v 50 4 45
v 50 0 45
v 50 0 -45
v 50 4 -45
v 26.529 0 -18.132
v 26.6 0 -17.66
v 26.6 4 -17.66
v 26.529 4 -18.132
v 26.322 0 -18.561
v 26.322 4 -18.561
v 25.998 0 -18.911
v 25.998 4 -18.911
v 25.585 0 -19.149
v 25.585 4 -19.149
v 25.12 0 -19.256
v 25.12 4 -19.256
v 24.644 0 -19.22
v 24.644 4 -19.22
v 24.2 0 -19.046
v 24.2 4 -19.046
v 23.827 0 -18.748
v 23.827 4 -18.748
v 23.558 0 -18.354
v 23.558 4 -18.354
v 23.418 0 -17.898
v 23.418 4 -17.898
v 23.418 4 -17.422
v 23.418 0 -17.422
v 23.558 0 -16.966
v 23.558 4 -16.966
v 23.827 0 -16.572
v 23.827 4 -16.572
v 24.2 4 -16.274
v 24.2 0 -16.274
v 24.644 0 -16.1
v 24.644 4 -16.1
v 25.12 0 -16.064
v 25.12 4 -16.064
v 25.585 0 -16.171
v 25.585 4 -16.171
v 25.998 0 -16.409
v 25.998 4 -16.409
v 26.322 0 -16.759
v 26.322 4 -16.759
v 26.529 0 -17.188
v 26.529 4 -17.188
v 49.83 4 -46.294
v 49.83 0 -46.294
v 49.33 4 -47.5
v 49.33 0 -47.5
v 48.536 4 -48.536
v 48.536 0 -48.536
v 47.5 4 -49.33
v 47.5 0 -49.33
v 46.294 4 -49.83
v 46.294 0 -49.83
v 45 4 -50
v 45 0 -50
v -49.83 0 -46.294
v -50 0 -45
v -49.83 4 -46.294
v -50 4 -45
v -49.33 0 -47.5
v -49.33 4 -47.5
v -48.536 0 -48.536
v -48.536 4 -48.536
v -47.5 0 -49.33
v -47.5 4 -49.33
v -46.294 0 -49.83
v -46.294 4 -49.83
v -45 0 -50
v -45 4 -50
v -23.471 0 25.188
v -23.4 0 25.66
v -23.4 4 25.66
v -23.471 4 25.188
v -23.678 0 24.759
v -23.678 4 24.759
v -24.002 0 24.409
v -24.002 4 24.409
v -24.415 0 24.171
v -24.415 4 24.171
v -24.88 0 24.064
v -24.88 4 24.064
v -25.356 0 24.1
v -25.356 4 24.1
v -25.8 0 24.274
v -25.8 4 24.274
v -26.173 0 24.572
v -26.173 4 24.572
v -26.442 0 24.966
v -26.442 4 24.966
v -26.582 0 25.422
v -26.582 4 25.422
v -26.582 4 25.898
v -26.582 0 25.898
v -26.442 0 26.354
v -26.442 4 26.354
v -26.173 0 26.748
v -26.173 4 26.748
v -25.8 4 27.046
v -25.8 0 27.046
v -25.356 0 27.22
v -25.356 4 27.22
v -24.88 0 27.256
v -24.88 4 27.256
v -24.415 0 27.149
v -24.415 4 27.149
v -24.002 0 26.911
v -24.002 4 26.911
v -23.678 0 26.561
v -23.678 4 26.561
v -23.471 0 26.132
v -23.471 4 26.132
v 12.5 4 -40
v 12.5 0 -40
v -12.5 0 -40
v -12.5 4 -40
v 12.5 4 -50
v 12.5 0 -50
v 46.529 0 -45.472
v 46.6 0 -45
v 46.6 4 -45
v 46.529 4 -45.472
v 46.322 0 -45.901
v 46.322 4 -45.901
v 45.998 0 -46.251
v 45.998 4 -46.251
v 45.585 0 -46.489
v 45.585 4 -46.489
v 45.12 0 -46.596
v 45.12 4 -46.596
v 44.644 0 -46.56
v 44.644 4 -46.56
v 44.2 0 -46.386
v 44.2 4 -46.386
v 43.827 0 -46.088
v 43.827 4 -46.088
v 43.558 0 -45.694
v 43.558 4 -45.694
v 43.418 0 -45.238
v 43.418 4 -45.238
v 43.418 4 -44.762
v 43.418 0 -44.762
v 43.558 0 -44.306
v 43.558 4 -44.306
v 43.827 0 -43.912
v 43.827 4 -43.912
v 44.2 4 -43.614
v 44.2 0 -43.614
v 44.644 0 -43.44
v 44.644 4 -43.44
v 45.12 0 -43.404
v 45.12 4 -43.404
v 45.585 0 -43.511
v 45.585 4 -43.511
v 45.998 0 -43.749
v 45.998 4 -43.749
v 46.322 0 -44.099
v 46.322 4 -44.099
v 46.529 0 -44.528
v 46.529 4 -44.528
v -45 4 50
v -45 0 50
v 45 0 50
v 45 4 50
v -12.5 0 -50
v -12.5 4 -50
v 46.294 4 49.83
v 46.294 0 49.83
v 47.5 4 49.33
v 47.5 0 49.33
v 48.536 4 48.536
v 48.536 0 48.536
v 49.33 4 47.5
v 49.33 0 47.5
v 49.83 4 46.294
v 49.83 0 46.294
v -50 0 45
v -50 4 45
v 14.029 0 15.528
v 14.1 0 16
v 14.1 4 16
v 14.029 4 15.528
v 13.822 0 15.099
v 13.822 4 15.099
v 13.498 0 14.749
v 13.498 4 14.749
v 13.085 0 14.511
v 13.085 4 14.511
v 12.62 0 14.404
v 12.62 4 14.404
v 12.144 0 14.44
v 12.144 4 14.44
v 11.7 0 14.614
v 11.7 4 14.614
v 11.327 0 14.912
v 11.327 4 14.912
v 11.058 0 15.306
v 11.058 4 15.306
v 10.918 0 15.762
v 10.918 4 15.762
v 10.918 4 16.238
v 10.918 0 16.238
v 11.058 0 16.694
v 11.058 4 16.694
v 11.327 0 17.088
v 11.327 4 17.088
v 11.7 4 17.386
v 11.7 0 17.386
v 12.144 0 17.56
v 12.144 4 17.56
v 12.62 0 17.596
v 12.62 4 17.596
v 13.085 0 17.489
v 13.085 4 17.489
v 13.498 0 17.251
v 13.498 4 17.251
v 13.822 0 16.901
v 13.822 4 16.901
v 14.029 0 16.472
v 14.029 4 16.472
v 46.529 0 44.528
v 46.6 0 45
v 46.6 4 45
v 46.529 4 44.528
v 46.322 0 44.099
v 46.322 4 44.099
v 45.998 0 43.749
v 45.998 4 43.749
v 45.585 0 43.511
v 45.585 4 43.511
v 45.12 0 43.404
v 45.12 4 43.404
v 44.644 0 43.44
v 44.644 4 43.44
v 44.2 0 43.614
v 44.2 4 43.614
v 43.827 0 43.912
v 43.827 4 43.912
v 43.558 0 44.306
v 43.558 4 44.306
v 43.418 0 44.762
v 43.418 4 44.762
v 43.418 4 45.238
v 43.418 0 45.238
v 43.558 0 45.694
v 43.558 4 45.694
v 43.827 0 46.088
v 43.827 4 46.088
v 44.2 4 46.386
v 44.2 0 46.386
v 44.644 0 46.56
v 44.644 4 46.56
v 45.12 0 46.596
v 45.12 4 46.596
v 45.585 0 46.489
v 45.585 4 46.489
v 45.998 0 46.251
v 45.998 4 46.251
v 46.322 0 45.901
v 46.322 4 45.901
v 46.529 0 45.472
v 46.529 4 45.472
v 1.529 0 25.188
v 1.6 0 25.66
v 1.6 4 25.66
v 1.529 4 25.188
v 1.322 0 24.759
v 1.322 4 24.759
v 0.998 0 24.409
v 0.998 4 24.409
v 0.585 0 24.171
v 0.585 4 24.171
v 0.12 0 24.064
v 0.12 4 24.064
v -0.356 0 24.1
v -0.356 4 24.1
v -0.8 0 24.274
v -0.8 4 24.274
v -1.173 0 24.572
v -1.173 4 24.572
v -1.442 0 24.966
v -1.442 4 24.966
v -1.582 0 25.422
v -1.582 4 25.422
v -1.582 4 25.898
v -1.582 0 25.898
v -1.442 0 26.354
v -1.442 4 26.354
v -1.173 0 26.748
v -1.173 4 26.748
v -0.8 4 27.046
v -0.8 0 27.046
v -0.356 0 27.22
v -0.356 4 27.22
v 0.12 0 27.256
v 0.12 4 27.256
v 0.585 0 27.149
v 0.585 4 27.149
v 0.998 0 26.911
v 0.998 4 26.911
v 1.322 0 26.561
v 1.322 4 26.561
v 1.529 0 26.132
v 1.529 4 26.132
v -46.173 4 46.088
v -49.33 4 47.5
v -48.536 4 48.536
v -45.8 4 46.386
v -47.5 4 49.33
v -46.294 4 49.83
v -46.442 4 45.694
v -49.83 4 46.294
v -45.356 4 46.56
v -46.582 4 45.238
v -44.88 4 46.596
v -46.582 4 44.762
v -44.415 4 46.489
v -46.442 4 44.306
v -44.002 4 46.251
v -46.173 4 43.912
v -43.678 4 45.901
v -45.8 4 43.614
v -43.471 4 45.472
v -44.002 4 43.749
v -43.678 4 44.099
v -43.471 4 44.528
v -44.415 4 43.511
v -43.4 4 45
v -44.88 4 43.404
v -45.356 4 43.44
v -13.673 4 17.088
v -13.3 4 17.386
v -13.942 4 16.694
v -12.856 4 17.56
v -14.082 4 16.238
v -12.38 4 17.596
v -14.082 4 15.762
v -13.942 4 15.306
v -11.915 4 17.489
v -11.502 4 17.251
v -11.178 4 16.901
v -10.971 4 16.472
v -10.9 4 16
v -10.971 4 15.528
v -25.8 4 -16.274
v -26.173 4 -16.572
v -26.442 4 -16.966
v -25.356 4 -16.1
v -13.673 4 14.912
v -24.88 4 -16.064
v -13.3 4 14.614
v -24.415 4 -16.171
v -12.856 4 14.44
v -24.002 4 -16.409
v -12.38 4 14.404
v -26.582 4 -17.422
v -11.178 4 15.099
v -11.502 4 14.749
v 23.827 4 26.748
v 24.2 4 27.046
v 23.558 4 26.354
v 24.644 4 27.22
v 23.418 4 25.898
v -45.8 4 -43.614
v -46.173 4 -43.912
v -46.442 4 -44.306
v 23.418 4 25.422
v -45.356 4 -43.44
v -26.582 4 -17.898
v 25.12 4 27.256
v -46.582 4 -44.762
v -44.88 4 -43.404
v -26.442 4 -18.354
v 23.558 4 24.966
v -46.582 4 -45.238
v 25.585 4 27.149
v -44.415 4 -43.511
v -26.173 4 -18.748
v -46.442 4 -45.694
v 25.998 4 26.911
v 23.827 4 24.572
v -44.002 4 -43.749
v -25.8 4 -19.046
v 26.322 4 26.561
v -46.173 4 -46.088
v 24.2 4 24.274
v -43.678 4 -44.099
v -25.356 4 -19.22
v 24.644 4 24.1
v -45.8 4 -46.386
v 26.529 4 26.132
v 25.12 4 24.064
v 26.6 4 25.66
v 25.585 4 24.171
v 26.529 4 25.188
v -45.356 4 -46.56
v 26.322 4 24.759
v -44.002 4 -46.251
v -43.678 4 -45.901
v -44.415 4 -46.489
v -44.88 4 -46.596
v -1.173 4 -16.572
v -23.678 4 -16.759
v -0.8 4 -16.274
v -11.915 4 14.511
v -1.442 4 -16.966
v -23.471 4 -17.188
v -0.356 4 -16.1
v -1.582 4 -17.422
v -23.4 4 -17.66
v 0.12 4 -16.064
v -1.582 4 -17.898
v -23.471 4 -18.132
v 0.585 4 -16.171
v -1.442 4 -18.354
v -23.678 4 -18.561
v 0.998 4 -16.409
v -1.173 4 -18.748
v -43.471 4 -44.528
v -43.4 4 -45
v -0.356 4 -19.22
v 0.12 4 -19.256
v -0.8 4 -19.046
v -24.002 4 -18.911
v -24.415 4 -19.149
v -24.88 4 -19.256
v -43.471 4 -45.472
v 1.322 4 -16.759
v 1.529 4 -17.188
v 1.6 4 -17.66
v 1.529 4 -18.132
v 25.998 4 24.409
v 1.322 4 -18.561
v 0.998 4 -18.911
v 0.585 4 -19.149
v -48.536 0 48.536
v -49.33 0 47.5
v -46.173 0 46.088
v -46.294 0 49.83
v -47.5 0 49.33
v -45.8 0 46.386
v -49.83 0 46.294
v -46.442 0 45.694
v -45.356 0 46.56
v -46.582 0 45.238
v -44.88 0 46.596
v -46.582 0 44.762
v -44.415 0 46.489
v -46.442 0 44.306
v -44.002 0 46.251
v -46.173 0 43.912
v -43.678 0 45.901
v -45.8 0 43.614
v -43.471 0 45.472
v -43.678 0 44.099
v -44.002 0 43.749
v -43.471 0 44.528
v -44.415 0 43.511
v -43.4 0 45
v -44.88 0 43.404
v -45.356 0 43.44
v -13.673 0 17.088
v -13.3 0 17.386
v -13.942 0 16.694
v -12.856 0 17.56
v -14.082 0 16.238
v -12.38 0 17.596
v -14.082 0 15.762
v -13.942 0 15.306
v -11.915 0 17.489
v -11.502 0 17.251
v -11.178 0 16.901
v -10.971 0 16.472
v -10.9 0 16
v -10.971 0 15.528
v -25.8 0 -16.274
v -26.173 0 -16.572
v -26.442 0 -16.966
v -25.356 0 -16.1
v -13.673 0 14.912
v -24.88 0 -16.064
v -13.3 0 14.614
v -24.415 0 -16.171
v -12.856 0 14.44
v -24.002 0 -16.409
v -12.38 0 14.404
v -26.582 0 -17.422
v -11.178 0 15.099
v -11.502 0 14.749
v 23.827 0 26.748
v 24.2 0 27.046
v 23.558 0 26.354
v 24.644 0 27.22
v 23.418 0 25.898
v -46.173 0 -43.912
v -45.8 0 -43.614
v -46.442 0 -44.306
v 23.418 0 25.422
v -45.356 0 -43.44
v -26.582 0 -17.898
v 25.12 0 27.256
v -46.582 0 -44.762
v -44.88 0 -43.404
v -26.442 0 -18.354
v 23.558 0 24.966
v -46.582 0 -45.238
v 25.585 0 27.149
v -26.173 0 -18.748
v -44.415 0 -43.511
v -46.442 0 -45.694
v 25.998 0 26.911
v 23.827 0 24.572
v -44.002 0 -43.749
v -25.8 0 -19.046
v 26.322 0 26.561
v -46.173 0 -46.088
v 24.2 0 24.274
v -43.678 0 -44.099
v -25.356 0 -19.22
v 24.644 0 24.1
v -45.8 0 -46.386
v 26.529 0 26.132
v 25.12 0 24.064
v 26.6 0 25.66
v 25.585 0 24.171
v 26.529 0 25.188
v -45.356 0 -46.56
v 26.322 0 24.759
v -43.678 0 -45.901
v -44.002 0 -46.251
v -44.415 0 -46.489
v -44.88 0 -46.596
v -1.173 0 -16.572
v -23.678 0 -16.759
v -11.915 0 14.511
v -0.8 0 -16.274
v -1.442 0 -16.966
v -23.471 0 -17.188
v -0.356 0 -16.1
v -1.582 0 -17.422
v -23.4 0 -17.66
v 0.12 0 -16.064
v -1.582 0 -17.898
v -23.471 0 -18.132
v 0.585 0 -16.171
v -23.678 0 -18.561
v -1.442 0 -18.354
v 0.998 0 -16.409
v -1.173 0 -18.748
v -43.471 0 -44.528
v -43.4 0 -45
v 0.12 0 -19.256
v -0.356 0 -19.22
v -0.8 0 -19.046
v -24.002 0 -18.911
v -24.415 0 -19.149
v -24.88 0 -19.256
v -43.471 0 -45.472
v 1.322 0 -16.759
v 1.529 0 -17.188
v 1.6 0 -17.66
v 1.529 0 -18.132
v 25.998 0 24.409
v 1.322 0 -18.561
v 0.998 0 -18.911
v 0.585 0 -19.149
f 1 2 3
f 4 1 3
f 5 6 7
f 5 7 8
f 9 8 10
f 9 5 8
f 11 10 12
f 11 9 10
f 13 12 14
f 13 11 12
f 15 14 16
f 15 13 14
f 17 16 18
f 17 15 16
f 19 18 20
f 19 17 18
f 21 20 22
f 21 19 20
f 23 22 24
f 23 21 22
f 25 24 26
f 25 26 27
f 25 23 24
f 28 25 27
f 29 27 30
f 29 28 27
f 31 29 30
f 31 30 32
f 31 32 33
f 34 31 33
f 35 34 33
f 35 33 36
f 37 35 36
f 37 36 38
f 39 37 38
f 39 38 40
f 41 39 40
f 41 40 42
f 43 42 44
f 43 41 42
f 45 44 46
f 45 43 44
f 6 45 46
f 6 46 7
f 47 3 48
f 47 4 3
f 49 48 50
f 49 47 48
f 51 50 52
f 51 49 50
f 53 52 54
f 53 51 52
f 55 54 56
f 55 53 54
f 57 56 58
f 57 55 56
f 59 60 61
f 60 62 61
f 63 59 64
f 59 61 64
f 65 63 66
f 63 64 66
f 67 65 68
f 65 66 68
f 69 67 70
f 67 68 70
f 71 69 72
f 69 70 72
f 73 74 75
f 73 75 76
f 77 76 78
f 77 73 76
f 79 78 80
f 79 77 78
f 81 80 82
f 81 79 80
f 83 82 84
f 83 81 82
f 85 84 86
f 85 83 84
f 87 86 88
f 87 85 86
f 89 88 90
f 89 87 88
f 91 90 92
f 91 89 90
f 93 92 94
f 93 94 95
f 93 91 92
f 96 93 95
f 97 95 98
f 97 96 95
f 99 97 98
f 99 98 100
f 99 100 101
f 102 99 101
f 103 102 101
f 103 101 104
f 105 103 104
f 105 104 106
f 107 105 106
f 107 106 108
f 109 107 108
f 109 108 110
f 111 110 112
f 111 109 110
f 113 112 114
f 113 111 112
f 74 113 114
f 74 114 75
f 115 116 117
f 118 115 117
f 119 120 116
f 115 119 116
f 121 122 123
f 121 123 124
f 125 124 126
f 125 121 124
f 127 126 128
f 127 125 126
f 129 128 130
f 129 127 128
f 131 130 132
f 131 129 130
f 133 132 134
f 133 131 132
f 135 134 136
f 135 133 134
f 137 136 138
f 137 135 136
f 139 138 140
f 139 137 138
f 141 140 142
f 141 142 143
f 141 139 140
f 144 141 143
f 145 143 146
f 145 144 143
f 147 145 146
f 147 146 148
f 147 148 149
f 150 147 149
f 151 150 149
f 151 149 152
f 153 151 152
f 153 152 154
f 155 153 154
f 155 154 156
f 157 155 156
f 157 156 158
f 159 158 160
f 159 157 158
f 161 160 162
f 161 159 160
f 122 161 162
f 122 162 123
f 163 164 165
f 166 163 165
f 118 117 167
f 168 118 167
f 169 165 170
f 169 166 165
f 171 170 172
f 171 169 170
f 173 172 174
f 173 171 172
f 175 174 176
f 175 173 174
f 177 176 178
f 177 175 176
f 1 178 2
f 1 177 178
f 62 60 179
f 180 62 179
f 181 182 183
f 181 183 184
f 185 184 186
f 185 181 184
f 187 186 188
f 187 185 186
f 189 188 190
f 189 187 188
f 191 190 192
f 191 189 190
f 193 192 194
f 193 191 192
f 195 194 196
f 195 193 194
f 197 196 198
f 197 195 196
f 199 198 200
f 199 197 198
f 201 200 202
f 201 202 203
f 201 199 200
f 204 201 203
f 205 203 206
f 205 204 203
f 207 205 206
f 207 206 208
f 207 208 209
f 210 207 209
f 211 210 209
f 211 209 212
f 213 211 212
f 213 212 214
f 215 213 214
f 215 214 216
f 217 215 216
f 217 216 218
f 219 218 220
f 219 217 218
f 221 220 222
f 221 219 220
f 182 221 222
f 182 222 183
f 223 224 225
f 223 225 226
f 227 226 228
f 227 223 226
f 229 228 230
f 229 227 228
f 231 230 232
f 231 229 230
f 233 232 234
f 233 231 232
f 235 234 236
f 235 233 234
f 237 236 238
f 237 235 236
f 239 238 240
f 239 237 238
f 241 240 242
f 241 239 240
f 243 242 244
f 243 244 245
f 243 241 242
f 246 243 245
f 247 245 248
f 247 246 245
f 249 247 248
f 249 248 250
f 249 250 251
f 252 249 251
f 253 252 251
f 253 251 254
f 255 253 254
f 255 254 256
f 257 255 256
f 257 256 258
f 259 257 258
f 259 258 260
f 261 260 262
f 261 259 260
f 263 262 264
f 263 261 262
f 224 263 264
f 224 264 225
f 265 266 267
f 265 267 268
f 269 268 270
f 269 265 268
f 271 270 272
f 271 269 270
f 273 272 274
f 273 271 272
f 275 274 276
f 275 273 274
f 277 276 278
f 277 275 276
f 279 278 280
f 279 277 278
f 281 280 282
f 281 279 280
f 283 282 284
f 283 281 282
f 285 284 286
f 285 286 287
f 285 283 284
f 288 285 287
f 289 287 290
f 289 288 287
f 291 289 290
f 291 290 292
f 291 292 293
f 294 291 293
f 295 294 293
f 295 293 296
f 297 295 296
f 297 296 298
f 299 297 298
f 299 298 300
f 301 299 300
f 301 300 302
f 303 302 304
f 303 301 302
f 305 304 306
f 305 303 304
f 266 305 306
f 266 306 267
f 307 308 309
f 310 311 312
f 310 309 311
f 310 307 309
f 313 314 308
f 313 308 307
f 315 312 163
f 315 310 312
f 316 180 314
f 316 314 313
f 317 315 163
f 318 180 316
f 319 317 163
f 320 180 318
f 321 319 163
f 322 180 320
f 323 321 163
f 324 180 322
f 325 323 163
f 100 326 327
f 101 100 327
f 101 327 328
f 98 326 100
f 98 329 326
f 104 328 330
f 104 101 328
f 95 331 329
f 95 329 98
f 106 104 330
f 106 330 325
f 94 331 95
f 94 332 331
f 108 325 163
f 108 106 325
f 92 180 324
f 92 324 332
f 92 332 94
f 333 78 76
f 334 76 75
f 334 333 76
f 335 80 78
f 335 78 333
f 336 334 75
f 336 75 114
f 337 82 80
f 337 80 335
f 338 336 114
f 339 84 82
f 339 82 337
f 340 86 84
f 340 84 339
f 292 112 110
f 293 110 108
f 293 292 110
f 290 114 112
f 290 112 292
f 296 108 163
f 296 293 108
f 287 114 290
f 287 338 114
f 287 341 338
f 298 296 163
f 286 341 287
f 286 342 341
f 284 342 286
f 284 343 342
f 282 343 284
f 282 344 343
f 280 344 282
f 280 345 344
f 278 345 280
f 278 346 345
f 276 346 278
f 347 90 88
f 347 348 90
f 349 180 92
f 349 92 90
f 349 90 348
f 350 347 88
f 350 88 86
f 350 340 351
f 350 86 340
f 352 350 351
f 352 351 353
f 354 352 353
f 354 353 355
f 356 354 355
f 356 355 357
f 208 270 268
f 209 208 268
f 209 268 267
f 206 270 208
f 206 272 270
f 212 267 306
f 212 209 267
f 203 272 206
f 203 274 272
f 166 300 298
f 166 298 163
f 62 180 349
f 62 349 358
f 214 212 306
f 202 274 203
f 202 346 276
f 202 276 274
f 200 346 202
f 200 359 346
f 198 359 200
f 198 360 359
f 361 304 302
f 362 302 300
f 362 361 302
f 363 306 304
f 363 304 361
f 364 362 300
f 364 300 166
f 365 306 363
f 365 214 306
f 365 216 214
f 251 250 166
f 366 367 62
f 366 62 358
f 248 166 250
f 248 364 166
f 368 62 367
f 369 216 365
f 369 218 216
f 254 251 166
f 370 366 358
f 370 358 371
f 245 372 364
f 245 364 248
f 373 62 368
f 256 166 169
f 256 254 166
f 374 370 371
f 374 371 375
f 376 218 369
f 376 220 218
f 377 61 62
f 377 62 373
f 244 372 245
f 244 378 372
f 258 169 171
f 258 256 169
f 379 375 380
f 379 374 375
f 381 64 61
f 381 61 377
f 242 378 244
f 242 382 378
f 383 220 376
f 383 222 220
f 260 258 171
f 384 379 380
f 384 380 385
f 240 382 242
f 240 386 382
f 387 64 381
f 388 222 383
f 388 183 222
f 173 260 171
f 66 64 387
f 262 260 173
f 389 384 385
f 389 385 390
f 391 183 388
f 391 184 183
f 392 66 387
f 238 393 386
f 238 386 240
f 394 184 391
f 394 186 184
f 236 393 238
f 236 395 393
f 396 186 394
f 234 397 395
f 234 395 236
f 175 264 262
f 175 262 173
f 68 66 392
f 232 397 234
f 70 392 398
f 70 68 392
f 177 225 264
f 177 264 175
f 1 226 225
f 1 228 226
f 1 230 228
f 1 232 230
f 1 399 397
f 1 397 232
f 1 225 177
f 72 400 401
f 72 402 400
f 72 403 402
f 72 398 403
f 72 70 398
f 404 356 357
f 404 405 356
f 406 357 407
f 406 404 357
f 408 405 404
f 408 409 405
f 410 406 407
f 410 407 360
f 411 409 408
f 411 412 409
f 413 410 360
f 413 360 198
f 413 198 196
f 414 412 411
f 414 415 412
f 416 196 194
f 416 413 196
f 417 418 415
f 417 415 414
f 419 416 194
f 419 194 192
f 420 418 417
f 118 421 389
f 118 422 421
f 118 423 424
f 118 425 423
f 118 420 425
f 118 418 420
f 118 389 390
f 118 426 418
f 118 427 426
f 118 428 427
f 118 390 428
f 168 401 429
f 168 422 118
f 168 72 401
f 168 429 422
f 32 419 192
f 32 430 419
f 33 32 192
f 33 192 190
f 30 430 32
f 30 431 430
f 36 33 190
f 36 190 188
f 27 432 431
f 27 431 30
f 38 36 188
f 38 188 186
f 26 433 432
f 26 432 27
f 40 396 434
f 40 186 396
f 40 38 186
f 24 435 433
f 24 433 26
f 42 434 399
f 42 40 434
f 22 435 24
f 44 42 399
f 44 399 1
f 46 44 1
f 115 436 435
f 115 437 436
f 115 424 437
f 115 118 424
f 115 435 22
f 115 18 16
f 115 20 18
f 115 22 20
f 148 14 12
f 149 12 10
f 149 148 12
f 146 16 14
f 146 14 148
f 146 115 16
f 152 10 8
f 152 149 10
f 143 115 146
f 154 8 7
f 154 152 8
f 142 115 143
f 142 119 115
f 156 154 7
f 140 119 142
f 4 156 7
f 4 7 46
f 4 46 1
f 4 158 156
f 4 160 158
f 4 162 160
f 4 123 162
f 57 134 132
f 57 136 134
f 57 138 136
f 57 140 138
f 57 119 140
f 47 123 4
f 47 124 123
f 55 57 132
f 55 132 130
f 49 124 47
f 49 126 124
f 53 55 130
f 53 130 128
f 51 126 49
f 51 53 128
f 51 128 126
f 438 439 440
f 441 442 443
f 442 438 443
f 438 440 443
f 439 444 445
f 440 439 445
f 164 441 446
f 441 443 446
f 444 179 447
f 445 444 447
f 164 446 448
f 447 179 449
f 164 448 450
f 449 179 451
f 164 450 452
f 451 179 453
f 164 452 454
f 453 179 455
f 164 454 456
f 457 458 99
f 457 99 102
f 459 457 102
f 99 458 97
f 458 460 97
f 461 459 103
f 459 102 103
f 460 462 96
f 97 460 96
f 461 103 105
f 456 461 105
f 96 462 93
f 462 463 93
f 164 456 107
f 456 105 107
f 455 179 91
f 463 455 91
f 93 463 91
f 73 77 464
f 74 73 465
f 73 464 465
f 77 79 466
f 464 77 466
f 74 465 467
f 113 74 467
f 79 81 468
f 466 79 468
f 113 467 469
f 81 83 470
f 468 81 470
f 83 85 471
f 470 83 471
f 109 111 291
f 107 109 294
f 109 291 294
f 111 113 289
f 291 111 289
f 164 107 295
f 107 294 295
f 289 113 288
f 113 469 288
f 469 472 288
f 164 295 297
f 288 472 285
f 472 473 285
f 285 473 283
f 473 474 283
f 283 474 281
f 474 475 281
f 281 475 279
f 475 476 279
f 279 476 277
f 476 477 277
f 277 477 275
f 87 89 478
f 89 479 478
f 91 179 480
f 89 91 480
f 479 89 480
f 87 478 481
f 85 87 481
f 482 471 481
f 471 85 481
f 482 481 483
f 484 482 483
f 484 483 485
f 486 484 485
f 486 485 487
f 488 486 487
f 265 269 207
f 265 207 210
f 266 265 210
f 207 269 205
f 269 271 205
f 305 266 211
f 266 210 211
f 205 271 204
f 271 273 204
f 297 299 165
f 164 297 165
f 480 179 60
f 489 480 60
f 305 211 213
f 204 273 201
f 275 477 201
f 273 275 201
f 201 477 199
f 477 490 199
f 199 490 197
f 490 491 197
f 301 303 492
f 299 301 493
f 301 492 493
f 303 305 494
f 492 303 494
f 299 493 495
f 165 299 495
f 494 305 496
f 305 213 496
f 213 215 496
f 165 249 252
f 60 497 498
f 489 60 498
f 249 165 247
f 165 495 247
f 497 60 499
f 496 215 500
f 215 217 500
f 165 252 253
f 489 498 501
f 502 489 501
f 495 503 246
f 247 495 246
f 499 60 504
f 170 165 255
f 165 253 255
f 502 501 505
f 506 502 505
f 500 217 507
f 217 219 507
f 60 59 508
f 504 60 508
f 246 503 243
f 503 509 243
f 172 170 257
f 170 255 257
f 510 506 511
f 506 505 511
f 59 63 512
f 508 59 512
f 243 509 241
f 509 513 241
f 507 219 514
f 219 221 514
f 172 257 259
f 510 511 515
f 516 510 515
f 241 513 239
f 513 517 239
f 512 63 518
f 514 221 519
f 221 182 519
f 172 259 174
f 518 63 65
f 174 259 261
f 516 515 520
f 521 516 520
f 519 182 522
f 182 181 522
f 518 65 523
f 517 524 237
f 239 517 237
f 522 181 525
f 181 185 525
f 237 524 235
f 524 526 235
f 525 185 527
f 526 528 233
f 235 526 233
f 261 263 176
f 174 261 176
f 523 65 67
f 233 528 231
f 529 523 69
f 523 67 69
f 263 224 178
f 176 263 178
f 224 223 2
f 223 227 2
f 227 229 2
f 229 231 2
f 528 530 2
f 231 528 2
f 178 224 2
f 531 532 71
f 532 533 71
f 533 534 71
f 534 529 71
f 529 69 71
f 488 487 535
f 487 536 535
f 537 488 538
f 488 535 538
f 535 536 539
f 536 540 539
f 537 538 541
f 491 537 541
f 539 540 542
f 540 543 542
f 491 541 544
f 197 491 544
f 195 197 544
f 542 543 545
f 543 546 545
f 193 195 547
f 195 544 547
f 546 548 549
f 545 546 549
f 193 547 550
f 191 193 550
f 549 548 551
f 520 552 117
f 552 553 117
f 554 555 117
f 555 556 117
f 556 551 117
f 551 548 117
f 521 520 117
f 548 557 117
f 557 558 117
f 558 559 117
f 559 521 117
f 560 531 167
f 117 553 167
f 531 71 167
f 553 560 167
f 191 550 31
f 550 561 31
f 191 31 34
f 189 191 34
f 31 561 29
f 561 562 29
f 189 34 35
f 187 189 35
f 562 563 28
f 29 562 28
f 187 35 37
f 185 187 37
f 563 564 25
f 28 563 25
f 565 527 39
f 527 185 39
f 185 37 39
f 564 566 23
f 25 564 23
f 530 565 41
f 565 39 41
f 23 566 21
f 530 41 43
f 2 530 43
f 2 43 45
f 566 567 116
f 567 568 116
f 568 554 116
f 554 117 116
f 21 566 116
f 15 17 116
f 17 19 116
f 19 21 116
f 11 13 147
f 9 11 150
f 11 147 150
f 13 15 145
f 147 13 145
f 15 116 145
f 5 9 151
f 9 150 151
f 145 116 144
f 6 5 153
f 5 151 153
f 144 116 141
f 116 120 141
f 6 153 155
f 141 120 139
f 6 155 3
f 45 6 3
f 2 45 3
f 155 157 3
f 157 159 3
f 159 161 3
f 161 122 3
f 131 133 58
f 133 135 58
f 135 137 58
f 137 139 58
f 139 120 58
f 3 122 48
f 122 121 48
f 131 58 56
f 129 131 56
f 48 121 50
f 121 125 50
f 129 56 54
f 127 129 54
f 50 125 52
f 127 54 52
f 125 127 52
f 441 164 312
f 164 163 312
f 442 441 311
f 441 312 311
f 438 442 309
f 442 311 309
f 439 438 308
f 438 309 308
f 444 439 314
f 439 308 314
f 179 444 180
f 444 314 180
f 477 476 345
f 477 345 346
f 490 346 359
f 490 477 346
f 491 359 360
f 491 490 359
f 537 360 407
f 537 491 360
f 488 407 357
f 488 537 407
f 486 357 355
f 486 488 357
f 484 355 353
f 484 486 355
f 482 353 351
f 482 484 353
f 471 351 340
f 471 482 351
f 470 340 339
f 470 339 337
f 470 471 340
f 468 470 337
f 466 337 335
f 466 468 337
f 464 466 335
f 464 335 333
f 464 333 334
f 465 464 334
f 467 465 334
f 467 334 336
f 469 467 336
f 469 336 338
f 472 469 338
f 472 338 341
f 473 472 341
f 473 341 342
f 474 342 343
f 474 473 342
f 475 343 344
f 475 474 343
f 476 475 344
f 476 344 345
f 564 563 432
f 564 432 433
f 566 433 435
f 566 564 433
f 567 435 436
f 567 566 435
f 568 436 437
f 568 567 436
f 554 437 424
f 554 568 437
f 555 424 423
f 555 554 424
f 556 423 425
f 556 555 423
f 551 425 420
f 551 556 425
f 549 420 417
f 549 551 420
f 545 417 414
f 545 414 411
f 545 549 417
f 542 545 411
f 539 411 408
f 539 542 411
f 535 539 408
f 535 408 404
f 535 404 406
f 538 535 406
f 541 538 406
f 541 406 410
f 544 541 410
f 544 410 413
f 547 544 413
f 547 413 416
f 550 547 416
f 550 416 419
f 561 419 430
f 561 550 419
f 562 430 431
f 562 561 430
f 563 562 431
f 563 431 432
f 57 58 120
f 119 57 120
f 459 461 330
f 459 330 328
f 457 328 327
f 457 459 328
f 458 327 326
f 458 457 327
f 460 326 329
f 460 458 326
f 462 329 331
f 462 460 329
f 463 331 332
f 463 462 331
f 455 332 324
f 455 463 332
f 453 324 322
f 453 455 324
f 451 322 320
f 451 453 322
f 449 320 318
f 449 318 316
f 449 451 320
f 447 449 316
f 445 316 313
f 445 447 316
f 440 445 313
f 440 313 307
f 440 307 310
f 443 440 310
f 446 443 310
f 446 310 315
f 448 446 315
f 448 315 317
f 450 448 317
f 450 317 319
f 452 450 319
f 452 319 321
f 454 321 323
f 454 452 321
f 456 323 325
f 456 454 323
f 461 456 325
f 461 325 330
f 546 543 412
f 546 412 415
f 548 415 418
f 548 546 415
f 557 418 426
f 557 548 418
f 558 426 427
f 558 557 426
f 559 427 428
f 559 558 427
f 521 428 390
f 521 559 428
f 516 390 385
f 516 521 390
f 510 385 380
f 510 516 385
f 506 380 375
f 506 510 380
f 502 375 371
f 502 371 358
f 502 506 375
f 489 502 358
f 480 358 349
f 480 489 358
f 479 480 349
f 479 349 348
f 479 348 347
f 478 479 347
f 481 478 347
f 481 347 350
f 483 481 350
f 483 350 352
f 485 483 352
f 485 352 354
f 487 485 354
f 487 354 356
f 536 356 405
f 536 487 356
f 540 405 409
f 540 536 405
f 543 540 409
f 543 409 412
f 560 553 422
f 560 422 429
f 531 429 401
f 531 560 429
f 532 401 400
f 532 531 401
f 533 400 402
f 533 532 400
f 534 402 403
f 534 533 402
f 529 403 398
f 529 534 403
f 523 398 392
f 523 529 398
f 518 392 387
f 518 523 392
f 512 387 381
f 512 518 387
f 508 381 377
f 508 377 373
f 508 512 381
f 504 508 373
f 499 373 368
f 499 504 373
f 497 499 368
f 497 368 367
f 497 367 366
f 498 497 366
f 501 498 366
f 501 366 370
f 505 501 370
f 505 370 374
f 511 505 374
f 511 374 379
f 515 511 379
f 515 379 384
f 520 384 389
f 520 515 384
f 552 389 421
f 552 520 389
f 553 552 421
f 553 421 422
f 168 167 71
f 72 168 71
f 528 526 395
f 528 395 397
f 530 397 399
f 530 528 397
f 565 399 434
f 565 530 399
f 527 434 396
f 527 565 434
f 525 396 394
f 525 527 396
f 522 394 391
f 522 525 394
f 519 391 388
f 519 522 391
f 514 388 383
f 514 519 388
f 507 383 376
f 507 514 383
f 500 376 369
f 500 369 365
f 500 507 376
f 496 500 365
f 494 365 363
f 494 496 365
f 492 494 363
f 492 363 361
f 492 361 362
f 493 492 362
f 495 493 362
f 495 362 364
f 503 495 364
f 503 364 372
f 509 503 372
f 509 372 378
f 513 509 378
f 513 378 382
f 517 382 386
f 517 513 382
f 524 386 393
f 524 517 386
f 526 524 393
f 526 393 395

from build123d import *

# Parameters (mm, degrees)
SKETCH1_R           = 1.6
BOSS_EXTRUDE1_DEPTH = 4
FILLET1_R           = 5


with BuildPart() as part:
    # Sketch1 → Boss-Extrude1 (new body)
    with BuildSketch(Plane(origin=(0, 0, 0), x_dir=(1, 0, 0), z_dir=(0, 1, 0))):
        Polygon((-50, -50), (50, -50), (50, 50), (12.5, 50), (12.5, 40), (-12.5, 40), (-12.5, 50), (-50, 50), align=None)
        with Locations((-45, -45)):
            Circle(SKETCH1_R, mode=Mode.SUBTRACT)
        with Locations((-25, -25.66)):
            Circle(SKETCH1_R, mode=Mode.SUBTRACT)
        with Locations((-12.5, -16)):
            Circle(SKETCH1_R, mode=Mode.SUBTRACT)
        with Locations((0, -25.66)):
            Circle(SKETCH1_R, mode=Mode.SUBTRACT)
        with Locations((45, -45)):
            Circle(SKETCH1_R, mode=Mode.SUBTRACT)
        with Locations((25, -25.66)):
            Circle(SKETCH1_R, mode=Mode.SUBTRACT)
        with Locations((12.5, -16)):
            Circle(SKETCH1_R, mode=Mode.SUBTRACT)
        with Locations((-25, 17.66)):
            Circle(SKETCH1_R, mode=Mode.SUBTRACT)
        with Locations((-45, 45)):
            Circle(SKETCH1_R, mode=Mode.SUBTRACT)
        with Locations((0, 17.66)):
            Circle(SKETCH1_R, mode=Mode.SUBTRACT)
        with Locations((25, 17.66)):
            Circle(SKETCH1_R, mode=Mode.SUBTRACT)
        with Locations((45, 45)):
            Circle(SKETCH1_R, mode=Mode.SUBTRACT)
    extrude(amount=BOSS_EXTRUDE1_DEPTH)

    # Fillet1
    fillet1_edges = [part.edges().sort_by_distance(p)[0] for p in [
        (50, 2, -50),
        (50, 2, 50),
        (-50, 2, 50),
        (-50, 2, -50),
    ]]
    fillet(fillet1_edges, radius=FILLET1_R)


solid = part.part
